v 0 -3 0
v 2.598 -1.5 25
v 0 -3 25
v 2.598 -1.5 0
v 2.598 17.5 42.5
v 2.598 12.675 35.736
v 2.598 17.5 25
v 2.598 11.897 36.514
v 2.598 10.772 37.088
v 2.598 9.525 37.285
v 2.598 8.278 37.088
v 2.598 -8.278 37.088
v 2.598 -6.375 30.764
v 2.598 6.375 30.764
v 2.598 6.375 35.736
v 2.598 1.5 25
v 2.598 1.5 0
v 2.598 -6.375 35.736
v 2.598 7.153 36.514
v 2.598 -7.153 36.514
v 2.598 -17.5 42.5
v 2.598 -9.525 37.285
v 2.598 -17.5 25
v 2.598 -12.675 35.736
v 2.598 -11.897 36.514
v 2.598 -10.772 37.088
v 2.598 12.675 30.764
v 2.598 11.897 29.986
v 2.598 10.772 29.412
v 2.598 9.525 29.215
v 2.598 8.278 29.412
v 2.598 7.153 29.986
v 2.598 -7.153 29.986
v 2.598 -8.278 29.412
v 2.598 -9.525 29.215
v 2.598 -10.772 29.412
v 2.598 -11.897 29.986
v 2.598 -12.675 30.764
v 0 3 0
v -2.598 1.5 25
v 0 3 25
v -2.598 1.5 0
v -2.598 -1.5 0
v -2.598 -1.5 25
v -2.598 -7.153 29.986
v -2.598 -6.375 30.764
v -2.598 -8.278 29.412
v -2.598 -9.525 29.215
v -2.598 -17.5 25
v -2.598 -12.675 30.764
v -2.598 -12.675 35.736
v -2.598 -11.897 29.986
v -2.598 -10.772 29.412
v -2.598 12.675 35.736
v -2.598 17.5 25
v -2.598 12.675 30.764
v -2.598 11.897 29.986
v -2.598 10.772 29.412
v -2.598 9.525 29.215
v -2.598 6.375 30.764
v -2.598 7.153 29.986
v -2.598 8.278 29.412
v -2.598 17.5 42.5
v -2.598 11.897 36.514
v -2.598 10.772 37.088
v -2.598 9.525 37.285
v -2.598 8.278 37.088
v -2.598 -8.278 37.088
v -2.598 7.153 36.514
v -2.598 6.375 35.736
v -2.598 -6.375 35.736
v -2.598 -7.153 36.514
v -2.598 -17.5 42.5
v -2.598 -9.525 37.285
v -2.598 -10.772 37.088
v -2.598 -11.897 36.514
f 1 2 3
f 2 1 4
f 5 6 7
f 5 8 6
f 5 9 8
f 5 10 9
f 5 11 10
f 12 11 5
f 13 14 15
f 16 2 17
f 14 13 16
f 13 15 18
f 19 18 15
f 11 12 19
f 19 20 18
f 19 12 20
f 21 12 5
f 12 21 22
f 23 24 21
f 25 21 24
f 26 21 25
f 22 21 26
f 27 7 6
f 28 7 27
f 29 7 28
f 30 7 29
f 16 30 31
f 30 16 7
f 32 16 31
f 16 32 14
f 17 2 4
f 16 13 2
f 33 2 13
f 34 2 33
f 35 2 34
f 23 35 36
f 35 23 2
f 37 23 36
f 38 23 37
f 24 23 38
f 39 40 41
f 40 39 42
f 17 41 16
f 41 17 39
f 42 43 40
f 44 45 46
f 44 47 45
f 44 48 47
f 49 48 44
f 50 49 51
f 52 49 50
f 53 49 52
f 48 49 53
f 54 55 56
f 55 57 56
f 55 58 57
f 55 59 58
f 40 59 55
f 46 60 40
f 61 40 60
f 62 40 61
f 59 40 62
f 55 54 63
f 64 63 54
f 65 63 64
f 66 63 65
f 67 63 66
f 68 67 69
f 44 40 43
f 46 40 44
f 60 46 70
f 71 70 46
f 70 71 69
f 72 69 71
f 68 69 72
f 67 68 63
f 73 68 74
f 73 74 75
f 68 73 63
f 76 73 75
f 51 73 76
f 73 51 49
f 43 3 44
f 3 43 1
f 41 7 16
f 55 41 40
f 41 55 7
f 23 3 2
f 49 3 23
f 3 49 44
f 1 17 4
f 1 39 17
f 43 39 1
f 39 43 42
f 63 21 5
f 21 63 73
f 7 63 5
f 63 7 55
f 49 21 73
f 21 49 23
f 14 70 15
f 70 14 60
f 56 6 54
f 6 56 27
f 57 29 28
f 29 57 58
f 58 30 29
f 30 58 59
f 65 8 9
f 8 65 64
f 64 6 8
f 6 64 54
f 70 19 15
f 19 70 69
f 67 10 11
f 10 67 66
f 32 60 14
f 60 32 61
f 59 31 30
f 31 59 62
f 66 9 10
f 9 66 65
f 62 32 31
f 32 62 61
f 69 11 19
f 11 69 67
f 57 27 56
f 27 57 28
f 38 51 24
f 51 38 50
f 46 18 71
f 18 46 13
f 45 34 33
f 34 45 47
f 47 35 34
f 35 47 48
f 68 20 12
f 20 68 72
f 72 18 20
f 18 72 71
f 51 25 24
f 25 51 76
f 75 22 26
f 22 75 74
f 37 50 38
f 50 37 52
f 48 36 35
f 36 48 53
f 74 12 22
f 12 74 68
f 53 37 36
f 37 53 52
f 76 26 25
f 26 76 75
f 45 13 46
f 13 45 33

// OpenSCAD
// file: bbs_connectors.scad
//
// This is a collection of connector cutouts for panels.
//

//--------------------------------------------------------------------------------------
// Dimensions for D-Sub connectors from http://www.interfacebus.com/Connector_D-Sub_Mechanical_Dimensions.html
// Since the cutouts are intended for either gender connector and since 3-D printer holes tend to be a little
// smaller than specified, the maximum tolerance sizes are used.  These may be tweaked if they turn out to
// still be a little too small.
//
// The coordinate origin is at the center of the connector.
//
// The dimensions of interest are:
// C - Distance between mounting holes.  The connector is assumed to be centered between them
// H - Horizontal size of cutout
// J - Vertical size of cutout
//
// Other dimensions that don't depend on the specific connector:
// Corner radius - 0.062 inches
// Screw hole size - 0.125 inches
//
// Dimension table
// Size   C      H      J
//   1  24.87  19.53  10.97
//   2  33.45  27.76  10.97
//   3  47.17  41.53  10.97
//   4  63.63  57.96  10.97
//   5  61.24  55.58  13.82
//   6  63.63  58.72  15.39
//
// Pins per connector
// Size  Standard  Dense
//    1     9        15
//    2    15        26
//    3    25        44
//    4    37        62
//    5    50        78
//    6   104       n/a
//
module bbs_d_cutout(size, height)
{
    if ((size < 1) || (size > 6))
    {
        echo("bbs_connectors.scad Invalid size given for D-sub connector ", size);
//        assert(false); // Assert may not be supported yet
    }
    screw_rad = 0.125 * 25.4/2;
    corner_rad = 0.063 * 25.4;
    c_sizes = [24.87, 33.45, 47.17, 63.63, 61.24, 63.63];
    h_sizes = [19.53, 27.76, 41.53, 57.96, 55.59, 58.72];
    j_sizes = [10.97, 10.97, 10.97, 10.97, 13.82, 15.39];
    size_c = c_sizes[size - 1];
    size_h = h_sizes[size - 1] + 1.5;
    size_j = j_sizes[size - 1] + 1.0;
    union()
    {
        translate([-size_c/2, 0, 0]) cylinder(r = screw_rad, h = height, $fn=20);
        translate([size_c/2, 0, 0]) cylinder(r = screw_rad, h = height, $fn=20);
        minkowski()
        {
            linear_extrude(height = height/2)
                polygon(points=[[-size_h/2+corner_rad, -size_j/2+corner_rad],
                    [size_h/2-corner_rad, -size_j/2+corner_rad], 
                    [size_h/2-corner_rad-sin(10)*size_j, size_j/2-corner_rad],
                    [-size_h/2+corner_rad+sin(10)*size_j, size_j/2-corner_rad]]);
            cylinder(r=corner_rad, h=height/2, $fn=20);
        }
    }
}

//--------------------------------------------------------------------------------------
//  These are like bannana connectors, but are a smaller diameter.  I have a bag of them
// from some unknown source.  I did find them at Digi-Key - search for tip connectors.
// As with most things at Digi-Key, there is a bewildering variaty of them and you will
// need to narrow down just what you need.  These are also cheaper than bannana connectors,
// which is probably why I have a bag of them.
//
module bbs_tip_connector()
{
    union()
    {
        cylinder(r=9.41/2, h=4.8);
        translate([0, 0, -14.19]) cylinder(r=6.22/2, h=14.19);
        translate([0, 0, -21.83]) cylinder(r=2.35/2, h=21.83);
    }
}

module bbs_tip_connector_cutout(height)
{
    intersection()
    {
        cylinder(r=6.32/2, h=height, $fn=20);
        translate([-6.32/2, -5.4/2, 0]) cube([6.32, 5.4, height]);
    }
}

//--------------------------------------------------------------------------------------
// Models and cutouts for Bannana jacks.  These are ubiquitous in lab equipment.
//
module bbs_bannana_connector()
{
    union()
    {
        cylinder(r=11.15/2, h=4.7);
        translate([0, 0, -11.91]) cylinder(r=7.78/2, h=11.91);
        translate([0, 0, -19.16]) cylinder(r=4.73/2, h=19.16);
    }
}

module bbs_bannana_connector_cutout(height)
{
    radius=8.07/2;
    width=6.3;
    intersection()
    {
        cylinder(r=radius, h=height, $fn=20);
        translate([-radius, -width/2, 0]) cube([radius*2, width, height]);
    }
}
//
// Standard spacing between bannana connectors.
//
function bbs_bannana_connector_spacing() = 19.05;

//--------------------------------------------------------------------------------------
// This is a cutout for a panel mounted Rj45 connector - AdaFruit part number 909
//

module bbs_rj45_panel_cutout(height)
{
    radius = 3.4/2;
    width = 15.66;
    offset = 2.76 + radius + width/2;
    tall = 14.00;
    union()
    {
        translate([-offset, 0, 0]) cylinder(r=radius, h = height, $fn=20);
        translate([offset, 0, 0]) cylinder(r=radius, h = height, $fn=20);
        translate([-width/2, -tall/2, 0]) cube([width, tall, height]);
    }
}

//--------------------------------------------------------------------------------------
bbs_d_cutout(1, 2);
translate([0, 15, 0]) bbs_tip_connector_cutout(2);
translate([10, 15, 0]) bbs_tip_connector();
translate([0, 30, 0]) bbs_bannana_connector_cutout(2);
translate([10, 30, 0]) bbs_bannana_connector();
translate([0, 45, 0]) bbs_rj45_panel_cutout(2);
// file: bbs_constants.scad
//
// This is a collection of constants that are often needed in various models.
//
// Use functions for constants that should be exported
//
// Sizes for the mini rack
//
function bbs_mini_rack_width() = 72;
function bbs_mini_rack_length() = 100;
//
// Sizes for the standard size rack
//
function bbs_std_rack_width() = 161;
function bbs_std_rack_length() = 200;
//
// Sizes for screw holes.  These are composed of the measured diameter plus a little "fudge factor" to be
// determined.  This is necessary since the printer makes holes a little smaller than they should be
// and to provide a little clearance.
//
function screw_2_size() = 2.10 + 0.25;
function screw_4_size() = 2.80 + 0.15;
function screw_6_size() = 3.38 + 0.3;
function screw_8_size() = 4.06 + 0.3;
function screw_m4_size() = 3.90 + 0.4;
// main file
//
// This file contains a number of different items that can mechanically interface with t-slotted aluminum
// extrusions.
//
use <bbs_constants.scad>
use <bbs_connectors.scad>

//
// Aluminum extrusion stand
//
module extrusion_stand()
{
    difference()
    {
        union()
        {
            translate([0, 0, 0]) cube([20, 20, 4]);
            translate([-4, 0, 0]) cube([4, 20, 24]);
            translate([20, 0, 0]) cube([4, 20, 24]);
            translate([-34, 0, -10]) cube([20, 20, 4]);
            translate([34, 0, -10]) cube([20, 20, 4]);
            translate([-14 ,0, -10]) rotate([0, -45, 0]) cube([20, 20, 4]);
            translate([20 ,0, 4]) rotate([0, 45, 0]) cube([20, 20, 4]);
        }
        union()
        {
            translate([10, 10, -0.1]) cylinder(r=screw_m4_size()/2, h=4.2, $fn=10);
            translate([-30, 10, -10.1]) cylinder(r=screw_m4_size()/2, h=4.2, $fn=10);
            translate([50, 10, -10.1]) cylinder(r=screw_m4_size()/2, h=4.2, $fn=10);
            translate([-4.1, 10, 14]) rotate([0, 90, 0]) cylinder(r=screw_m4_size()/2, h=30, $fn=10);
        }
    }
}
//
// The module defines a plate with 20mm x 20mm hole spacing with a 10mm border around the edge.  It
// can be attached to extrusions and used to mount other items.
//
module extrusion_plate(length, width)
{
    size_x = length*20;
    size_y = width*20;
    size_z = 4;
    hole_rad = screw_8_size()/2;
    $nf = 10;
    difference()
    {
        cube([size_x, size_y, size_z]);
        union()
        {
            for(x = [10:20:size_x - 10])
            {
                for(y = [10:20:size_y - 10])
                {
                    translate([x, y, -0.1]) cylinder(r=hole_rad, h=size_z + 0.2);
                }
            }
            //
            // This is added to make it easier to lift a corner for removal from the
            // printer.  It can be eliminated, if not needed.
            //
            translate([5, -0.1, -0.1]) cube([1, 2, 2]);
        }
    }
}
//
// A base for mounting items.
//
module LOCAL_mount()
{
    difference()
    {
        union()
        {
            translate([0, 10, 0]) cylinder(r=5, h=30, $fn=20);
            translate([-2, 0, 0]) cube([4, 20, 30]);
        }
        union()
        {
            translate([0, 10, 7]) rotate([0, 0, 30]) cylinder(r=3.1, h=30, $fn=6);
            translate([-0.5, -0.1, 7]) cube([1, 20.2, 30]);
            translate([-3, 3, 25]) rotate([0, 90, 0]) cylinder(r=screw_4_size()/2, h=6, $fn=20);
            translate([-3, 17, 25]) rotate([0, 90, 0]) cylinder(r=screw_4_size()/2, h=6, $fn=20);
        }
    }
}
//
module extrusion_mount_base()
{
    union()
    {
        difference()
        {
            cube([60, 20, 4]);
            union()
            {
                translate([10, 10, -0.1]) cylinder(r=screw_m4_size()/2, h=4.2, $fn=10);
                translate([50, 10, -0.1]) cylinder(r=screw_m4_size()/2, h=4.2, $fn=10);
            }
        }
        translate([30, 0, 0]) LOCAL_mount();
    }
}
//
// A base for mounting two items.
//
module extrusion_dual_mount_base()
{
    union()
    {
        difference()
        {
            cube([60, 20, 4]);
            union()
            {
                translate([10, 10, -0.1]) cylinder(r=screw_m4_size()/2, h=4.2, $fn=10);
                translate([30, 10, -0.1]) cylinder(r=screw_m4_size()/2, h=4.2, $fn=10);
                translate([50, 10, -0.1]) cylinder(r=screw_m4_size()/2, h=4.2, $fn=10);
            }
        }
        translate([20, 0, 0]) LOCAL_mount();
        translate([40, 0, 0]) LOCAL_mount();
    }
}
//
// Things that can attach to the mounting base.
//
//  Holder for a couple of banana jacks - used to connect to other items.
//
module extrusion_banana()
{
    flange_dia = 35;
    small_r = 3*sqrt(3)/2;
    difference()
    {
        union()
        {
            rotate([0, 0, 30]) cylinder(r=3, h=25, $fn=6);
            translate([-small_r, -flange_dia/2, 25]) cube([small_r*2, flange_dia, flange_dia/2]);
        }
        union()
        {
            translate([-2.7, bbs_bannana_connector_spacing()/2, 24.5+flange_dia/4])
                rotate([0, 90, 0]) bbs_bannana_connector_cutout(6);
            translate([-2.7, -bbs_bannana_connector_spacing()/2, 24.5+flange_dia/4])
                rotate([0, 90, 0]) bbs_bannana_connector_cutout(6);
        }
    }
}

extrusion_banana();
//extrusion_mount_base();
//extrusion_dual_mount_base();
//extrusion_stand();
//extrusion_plate(10, 10);
